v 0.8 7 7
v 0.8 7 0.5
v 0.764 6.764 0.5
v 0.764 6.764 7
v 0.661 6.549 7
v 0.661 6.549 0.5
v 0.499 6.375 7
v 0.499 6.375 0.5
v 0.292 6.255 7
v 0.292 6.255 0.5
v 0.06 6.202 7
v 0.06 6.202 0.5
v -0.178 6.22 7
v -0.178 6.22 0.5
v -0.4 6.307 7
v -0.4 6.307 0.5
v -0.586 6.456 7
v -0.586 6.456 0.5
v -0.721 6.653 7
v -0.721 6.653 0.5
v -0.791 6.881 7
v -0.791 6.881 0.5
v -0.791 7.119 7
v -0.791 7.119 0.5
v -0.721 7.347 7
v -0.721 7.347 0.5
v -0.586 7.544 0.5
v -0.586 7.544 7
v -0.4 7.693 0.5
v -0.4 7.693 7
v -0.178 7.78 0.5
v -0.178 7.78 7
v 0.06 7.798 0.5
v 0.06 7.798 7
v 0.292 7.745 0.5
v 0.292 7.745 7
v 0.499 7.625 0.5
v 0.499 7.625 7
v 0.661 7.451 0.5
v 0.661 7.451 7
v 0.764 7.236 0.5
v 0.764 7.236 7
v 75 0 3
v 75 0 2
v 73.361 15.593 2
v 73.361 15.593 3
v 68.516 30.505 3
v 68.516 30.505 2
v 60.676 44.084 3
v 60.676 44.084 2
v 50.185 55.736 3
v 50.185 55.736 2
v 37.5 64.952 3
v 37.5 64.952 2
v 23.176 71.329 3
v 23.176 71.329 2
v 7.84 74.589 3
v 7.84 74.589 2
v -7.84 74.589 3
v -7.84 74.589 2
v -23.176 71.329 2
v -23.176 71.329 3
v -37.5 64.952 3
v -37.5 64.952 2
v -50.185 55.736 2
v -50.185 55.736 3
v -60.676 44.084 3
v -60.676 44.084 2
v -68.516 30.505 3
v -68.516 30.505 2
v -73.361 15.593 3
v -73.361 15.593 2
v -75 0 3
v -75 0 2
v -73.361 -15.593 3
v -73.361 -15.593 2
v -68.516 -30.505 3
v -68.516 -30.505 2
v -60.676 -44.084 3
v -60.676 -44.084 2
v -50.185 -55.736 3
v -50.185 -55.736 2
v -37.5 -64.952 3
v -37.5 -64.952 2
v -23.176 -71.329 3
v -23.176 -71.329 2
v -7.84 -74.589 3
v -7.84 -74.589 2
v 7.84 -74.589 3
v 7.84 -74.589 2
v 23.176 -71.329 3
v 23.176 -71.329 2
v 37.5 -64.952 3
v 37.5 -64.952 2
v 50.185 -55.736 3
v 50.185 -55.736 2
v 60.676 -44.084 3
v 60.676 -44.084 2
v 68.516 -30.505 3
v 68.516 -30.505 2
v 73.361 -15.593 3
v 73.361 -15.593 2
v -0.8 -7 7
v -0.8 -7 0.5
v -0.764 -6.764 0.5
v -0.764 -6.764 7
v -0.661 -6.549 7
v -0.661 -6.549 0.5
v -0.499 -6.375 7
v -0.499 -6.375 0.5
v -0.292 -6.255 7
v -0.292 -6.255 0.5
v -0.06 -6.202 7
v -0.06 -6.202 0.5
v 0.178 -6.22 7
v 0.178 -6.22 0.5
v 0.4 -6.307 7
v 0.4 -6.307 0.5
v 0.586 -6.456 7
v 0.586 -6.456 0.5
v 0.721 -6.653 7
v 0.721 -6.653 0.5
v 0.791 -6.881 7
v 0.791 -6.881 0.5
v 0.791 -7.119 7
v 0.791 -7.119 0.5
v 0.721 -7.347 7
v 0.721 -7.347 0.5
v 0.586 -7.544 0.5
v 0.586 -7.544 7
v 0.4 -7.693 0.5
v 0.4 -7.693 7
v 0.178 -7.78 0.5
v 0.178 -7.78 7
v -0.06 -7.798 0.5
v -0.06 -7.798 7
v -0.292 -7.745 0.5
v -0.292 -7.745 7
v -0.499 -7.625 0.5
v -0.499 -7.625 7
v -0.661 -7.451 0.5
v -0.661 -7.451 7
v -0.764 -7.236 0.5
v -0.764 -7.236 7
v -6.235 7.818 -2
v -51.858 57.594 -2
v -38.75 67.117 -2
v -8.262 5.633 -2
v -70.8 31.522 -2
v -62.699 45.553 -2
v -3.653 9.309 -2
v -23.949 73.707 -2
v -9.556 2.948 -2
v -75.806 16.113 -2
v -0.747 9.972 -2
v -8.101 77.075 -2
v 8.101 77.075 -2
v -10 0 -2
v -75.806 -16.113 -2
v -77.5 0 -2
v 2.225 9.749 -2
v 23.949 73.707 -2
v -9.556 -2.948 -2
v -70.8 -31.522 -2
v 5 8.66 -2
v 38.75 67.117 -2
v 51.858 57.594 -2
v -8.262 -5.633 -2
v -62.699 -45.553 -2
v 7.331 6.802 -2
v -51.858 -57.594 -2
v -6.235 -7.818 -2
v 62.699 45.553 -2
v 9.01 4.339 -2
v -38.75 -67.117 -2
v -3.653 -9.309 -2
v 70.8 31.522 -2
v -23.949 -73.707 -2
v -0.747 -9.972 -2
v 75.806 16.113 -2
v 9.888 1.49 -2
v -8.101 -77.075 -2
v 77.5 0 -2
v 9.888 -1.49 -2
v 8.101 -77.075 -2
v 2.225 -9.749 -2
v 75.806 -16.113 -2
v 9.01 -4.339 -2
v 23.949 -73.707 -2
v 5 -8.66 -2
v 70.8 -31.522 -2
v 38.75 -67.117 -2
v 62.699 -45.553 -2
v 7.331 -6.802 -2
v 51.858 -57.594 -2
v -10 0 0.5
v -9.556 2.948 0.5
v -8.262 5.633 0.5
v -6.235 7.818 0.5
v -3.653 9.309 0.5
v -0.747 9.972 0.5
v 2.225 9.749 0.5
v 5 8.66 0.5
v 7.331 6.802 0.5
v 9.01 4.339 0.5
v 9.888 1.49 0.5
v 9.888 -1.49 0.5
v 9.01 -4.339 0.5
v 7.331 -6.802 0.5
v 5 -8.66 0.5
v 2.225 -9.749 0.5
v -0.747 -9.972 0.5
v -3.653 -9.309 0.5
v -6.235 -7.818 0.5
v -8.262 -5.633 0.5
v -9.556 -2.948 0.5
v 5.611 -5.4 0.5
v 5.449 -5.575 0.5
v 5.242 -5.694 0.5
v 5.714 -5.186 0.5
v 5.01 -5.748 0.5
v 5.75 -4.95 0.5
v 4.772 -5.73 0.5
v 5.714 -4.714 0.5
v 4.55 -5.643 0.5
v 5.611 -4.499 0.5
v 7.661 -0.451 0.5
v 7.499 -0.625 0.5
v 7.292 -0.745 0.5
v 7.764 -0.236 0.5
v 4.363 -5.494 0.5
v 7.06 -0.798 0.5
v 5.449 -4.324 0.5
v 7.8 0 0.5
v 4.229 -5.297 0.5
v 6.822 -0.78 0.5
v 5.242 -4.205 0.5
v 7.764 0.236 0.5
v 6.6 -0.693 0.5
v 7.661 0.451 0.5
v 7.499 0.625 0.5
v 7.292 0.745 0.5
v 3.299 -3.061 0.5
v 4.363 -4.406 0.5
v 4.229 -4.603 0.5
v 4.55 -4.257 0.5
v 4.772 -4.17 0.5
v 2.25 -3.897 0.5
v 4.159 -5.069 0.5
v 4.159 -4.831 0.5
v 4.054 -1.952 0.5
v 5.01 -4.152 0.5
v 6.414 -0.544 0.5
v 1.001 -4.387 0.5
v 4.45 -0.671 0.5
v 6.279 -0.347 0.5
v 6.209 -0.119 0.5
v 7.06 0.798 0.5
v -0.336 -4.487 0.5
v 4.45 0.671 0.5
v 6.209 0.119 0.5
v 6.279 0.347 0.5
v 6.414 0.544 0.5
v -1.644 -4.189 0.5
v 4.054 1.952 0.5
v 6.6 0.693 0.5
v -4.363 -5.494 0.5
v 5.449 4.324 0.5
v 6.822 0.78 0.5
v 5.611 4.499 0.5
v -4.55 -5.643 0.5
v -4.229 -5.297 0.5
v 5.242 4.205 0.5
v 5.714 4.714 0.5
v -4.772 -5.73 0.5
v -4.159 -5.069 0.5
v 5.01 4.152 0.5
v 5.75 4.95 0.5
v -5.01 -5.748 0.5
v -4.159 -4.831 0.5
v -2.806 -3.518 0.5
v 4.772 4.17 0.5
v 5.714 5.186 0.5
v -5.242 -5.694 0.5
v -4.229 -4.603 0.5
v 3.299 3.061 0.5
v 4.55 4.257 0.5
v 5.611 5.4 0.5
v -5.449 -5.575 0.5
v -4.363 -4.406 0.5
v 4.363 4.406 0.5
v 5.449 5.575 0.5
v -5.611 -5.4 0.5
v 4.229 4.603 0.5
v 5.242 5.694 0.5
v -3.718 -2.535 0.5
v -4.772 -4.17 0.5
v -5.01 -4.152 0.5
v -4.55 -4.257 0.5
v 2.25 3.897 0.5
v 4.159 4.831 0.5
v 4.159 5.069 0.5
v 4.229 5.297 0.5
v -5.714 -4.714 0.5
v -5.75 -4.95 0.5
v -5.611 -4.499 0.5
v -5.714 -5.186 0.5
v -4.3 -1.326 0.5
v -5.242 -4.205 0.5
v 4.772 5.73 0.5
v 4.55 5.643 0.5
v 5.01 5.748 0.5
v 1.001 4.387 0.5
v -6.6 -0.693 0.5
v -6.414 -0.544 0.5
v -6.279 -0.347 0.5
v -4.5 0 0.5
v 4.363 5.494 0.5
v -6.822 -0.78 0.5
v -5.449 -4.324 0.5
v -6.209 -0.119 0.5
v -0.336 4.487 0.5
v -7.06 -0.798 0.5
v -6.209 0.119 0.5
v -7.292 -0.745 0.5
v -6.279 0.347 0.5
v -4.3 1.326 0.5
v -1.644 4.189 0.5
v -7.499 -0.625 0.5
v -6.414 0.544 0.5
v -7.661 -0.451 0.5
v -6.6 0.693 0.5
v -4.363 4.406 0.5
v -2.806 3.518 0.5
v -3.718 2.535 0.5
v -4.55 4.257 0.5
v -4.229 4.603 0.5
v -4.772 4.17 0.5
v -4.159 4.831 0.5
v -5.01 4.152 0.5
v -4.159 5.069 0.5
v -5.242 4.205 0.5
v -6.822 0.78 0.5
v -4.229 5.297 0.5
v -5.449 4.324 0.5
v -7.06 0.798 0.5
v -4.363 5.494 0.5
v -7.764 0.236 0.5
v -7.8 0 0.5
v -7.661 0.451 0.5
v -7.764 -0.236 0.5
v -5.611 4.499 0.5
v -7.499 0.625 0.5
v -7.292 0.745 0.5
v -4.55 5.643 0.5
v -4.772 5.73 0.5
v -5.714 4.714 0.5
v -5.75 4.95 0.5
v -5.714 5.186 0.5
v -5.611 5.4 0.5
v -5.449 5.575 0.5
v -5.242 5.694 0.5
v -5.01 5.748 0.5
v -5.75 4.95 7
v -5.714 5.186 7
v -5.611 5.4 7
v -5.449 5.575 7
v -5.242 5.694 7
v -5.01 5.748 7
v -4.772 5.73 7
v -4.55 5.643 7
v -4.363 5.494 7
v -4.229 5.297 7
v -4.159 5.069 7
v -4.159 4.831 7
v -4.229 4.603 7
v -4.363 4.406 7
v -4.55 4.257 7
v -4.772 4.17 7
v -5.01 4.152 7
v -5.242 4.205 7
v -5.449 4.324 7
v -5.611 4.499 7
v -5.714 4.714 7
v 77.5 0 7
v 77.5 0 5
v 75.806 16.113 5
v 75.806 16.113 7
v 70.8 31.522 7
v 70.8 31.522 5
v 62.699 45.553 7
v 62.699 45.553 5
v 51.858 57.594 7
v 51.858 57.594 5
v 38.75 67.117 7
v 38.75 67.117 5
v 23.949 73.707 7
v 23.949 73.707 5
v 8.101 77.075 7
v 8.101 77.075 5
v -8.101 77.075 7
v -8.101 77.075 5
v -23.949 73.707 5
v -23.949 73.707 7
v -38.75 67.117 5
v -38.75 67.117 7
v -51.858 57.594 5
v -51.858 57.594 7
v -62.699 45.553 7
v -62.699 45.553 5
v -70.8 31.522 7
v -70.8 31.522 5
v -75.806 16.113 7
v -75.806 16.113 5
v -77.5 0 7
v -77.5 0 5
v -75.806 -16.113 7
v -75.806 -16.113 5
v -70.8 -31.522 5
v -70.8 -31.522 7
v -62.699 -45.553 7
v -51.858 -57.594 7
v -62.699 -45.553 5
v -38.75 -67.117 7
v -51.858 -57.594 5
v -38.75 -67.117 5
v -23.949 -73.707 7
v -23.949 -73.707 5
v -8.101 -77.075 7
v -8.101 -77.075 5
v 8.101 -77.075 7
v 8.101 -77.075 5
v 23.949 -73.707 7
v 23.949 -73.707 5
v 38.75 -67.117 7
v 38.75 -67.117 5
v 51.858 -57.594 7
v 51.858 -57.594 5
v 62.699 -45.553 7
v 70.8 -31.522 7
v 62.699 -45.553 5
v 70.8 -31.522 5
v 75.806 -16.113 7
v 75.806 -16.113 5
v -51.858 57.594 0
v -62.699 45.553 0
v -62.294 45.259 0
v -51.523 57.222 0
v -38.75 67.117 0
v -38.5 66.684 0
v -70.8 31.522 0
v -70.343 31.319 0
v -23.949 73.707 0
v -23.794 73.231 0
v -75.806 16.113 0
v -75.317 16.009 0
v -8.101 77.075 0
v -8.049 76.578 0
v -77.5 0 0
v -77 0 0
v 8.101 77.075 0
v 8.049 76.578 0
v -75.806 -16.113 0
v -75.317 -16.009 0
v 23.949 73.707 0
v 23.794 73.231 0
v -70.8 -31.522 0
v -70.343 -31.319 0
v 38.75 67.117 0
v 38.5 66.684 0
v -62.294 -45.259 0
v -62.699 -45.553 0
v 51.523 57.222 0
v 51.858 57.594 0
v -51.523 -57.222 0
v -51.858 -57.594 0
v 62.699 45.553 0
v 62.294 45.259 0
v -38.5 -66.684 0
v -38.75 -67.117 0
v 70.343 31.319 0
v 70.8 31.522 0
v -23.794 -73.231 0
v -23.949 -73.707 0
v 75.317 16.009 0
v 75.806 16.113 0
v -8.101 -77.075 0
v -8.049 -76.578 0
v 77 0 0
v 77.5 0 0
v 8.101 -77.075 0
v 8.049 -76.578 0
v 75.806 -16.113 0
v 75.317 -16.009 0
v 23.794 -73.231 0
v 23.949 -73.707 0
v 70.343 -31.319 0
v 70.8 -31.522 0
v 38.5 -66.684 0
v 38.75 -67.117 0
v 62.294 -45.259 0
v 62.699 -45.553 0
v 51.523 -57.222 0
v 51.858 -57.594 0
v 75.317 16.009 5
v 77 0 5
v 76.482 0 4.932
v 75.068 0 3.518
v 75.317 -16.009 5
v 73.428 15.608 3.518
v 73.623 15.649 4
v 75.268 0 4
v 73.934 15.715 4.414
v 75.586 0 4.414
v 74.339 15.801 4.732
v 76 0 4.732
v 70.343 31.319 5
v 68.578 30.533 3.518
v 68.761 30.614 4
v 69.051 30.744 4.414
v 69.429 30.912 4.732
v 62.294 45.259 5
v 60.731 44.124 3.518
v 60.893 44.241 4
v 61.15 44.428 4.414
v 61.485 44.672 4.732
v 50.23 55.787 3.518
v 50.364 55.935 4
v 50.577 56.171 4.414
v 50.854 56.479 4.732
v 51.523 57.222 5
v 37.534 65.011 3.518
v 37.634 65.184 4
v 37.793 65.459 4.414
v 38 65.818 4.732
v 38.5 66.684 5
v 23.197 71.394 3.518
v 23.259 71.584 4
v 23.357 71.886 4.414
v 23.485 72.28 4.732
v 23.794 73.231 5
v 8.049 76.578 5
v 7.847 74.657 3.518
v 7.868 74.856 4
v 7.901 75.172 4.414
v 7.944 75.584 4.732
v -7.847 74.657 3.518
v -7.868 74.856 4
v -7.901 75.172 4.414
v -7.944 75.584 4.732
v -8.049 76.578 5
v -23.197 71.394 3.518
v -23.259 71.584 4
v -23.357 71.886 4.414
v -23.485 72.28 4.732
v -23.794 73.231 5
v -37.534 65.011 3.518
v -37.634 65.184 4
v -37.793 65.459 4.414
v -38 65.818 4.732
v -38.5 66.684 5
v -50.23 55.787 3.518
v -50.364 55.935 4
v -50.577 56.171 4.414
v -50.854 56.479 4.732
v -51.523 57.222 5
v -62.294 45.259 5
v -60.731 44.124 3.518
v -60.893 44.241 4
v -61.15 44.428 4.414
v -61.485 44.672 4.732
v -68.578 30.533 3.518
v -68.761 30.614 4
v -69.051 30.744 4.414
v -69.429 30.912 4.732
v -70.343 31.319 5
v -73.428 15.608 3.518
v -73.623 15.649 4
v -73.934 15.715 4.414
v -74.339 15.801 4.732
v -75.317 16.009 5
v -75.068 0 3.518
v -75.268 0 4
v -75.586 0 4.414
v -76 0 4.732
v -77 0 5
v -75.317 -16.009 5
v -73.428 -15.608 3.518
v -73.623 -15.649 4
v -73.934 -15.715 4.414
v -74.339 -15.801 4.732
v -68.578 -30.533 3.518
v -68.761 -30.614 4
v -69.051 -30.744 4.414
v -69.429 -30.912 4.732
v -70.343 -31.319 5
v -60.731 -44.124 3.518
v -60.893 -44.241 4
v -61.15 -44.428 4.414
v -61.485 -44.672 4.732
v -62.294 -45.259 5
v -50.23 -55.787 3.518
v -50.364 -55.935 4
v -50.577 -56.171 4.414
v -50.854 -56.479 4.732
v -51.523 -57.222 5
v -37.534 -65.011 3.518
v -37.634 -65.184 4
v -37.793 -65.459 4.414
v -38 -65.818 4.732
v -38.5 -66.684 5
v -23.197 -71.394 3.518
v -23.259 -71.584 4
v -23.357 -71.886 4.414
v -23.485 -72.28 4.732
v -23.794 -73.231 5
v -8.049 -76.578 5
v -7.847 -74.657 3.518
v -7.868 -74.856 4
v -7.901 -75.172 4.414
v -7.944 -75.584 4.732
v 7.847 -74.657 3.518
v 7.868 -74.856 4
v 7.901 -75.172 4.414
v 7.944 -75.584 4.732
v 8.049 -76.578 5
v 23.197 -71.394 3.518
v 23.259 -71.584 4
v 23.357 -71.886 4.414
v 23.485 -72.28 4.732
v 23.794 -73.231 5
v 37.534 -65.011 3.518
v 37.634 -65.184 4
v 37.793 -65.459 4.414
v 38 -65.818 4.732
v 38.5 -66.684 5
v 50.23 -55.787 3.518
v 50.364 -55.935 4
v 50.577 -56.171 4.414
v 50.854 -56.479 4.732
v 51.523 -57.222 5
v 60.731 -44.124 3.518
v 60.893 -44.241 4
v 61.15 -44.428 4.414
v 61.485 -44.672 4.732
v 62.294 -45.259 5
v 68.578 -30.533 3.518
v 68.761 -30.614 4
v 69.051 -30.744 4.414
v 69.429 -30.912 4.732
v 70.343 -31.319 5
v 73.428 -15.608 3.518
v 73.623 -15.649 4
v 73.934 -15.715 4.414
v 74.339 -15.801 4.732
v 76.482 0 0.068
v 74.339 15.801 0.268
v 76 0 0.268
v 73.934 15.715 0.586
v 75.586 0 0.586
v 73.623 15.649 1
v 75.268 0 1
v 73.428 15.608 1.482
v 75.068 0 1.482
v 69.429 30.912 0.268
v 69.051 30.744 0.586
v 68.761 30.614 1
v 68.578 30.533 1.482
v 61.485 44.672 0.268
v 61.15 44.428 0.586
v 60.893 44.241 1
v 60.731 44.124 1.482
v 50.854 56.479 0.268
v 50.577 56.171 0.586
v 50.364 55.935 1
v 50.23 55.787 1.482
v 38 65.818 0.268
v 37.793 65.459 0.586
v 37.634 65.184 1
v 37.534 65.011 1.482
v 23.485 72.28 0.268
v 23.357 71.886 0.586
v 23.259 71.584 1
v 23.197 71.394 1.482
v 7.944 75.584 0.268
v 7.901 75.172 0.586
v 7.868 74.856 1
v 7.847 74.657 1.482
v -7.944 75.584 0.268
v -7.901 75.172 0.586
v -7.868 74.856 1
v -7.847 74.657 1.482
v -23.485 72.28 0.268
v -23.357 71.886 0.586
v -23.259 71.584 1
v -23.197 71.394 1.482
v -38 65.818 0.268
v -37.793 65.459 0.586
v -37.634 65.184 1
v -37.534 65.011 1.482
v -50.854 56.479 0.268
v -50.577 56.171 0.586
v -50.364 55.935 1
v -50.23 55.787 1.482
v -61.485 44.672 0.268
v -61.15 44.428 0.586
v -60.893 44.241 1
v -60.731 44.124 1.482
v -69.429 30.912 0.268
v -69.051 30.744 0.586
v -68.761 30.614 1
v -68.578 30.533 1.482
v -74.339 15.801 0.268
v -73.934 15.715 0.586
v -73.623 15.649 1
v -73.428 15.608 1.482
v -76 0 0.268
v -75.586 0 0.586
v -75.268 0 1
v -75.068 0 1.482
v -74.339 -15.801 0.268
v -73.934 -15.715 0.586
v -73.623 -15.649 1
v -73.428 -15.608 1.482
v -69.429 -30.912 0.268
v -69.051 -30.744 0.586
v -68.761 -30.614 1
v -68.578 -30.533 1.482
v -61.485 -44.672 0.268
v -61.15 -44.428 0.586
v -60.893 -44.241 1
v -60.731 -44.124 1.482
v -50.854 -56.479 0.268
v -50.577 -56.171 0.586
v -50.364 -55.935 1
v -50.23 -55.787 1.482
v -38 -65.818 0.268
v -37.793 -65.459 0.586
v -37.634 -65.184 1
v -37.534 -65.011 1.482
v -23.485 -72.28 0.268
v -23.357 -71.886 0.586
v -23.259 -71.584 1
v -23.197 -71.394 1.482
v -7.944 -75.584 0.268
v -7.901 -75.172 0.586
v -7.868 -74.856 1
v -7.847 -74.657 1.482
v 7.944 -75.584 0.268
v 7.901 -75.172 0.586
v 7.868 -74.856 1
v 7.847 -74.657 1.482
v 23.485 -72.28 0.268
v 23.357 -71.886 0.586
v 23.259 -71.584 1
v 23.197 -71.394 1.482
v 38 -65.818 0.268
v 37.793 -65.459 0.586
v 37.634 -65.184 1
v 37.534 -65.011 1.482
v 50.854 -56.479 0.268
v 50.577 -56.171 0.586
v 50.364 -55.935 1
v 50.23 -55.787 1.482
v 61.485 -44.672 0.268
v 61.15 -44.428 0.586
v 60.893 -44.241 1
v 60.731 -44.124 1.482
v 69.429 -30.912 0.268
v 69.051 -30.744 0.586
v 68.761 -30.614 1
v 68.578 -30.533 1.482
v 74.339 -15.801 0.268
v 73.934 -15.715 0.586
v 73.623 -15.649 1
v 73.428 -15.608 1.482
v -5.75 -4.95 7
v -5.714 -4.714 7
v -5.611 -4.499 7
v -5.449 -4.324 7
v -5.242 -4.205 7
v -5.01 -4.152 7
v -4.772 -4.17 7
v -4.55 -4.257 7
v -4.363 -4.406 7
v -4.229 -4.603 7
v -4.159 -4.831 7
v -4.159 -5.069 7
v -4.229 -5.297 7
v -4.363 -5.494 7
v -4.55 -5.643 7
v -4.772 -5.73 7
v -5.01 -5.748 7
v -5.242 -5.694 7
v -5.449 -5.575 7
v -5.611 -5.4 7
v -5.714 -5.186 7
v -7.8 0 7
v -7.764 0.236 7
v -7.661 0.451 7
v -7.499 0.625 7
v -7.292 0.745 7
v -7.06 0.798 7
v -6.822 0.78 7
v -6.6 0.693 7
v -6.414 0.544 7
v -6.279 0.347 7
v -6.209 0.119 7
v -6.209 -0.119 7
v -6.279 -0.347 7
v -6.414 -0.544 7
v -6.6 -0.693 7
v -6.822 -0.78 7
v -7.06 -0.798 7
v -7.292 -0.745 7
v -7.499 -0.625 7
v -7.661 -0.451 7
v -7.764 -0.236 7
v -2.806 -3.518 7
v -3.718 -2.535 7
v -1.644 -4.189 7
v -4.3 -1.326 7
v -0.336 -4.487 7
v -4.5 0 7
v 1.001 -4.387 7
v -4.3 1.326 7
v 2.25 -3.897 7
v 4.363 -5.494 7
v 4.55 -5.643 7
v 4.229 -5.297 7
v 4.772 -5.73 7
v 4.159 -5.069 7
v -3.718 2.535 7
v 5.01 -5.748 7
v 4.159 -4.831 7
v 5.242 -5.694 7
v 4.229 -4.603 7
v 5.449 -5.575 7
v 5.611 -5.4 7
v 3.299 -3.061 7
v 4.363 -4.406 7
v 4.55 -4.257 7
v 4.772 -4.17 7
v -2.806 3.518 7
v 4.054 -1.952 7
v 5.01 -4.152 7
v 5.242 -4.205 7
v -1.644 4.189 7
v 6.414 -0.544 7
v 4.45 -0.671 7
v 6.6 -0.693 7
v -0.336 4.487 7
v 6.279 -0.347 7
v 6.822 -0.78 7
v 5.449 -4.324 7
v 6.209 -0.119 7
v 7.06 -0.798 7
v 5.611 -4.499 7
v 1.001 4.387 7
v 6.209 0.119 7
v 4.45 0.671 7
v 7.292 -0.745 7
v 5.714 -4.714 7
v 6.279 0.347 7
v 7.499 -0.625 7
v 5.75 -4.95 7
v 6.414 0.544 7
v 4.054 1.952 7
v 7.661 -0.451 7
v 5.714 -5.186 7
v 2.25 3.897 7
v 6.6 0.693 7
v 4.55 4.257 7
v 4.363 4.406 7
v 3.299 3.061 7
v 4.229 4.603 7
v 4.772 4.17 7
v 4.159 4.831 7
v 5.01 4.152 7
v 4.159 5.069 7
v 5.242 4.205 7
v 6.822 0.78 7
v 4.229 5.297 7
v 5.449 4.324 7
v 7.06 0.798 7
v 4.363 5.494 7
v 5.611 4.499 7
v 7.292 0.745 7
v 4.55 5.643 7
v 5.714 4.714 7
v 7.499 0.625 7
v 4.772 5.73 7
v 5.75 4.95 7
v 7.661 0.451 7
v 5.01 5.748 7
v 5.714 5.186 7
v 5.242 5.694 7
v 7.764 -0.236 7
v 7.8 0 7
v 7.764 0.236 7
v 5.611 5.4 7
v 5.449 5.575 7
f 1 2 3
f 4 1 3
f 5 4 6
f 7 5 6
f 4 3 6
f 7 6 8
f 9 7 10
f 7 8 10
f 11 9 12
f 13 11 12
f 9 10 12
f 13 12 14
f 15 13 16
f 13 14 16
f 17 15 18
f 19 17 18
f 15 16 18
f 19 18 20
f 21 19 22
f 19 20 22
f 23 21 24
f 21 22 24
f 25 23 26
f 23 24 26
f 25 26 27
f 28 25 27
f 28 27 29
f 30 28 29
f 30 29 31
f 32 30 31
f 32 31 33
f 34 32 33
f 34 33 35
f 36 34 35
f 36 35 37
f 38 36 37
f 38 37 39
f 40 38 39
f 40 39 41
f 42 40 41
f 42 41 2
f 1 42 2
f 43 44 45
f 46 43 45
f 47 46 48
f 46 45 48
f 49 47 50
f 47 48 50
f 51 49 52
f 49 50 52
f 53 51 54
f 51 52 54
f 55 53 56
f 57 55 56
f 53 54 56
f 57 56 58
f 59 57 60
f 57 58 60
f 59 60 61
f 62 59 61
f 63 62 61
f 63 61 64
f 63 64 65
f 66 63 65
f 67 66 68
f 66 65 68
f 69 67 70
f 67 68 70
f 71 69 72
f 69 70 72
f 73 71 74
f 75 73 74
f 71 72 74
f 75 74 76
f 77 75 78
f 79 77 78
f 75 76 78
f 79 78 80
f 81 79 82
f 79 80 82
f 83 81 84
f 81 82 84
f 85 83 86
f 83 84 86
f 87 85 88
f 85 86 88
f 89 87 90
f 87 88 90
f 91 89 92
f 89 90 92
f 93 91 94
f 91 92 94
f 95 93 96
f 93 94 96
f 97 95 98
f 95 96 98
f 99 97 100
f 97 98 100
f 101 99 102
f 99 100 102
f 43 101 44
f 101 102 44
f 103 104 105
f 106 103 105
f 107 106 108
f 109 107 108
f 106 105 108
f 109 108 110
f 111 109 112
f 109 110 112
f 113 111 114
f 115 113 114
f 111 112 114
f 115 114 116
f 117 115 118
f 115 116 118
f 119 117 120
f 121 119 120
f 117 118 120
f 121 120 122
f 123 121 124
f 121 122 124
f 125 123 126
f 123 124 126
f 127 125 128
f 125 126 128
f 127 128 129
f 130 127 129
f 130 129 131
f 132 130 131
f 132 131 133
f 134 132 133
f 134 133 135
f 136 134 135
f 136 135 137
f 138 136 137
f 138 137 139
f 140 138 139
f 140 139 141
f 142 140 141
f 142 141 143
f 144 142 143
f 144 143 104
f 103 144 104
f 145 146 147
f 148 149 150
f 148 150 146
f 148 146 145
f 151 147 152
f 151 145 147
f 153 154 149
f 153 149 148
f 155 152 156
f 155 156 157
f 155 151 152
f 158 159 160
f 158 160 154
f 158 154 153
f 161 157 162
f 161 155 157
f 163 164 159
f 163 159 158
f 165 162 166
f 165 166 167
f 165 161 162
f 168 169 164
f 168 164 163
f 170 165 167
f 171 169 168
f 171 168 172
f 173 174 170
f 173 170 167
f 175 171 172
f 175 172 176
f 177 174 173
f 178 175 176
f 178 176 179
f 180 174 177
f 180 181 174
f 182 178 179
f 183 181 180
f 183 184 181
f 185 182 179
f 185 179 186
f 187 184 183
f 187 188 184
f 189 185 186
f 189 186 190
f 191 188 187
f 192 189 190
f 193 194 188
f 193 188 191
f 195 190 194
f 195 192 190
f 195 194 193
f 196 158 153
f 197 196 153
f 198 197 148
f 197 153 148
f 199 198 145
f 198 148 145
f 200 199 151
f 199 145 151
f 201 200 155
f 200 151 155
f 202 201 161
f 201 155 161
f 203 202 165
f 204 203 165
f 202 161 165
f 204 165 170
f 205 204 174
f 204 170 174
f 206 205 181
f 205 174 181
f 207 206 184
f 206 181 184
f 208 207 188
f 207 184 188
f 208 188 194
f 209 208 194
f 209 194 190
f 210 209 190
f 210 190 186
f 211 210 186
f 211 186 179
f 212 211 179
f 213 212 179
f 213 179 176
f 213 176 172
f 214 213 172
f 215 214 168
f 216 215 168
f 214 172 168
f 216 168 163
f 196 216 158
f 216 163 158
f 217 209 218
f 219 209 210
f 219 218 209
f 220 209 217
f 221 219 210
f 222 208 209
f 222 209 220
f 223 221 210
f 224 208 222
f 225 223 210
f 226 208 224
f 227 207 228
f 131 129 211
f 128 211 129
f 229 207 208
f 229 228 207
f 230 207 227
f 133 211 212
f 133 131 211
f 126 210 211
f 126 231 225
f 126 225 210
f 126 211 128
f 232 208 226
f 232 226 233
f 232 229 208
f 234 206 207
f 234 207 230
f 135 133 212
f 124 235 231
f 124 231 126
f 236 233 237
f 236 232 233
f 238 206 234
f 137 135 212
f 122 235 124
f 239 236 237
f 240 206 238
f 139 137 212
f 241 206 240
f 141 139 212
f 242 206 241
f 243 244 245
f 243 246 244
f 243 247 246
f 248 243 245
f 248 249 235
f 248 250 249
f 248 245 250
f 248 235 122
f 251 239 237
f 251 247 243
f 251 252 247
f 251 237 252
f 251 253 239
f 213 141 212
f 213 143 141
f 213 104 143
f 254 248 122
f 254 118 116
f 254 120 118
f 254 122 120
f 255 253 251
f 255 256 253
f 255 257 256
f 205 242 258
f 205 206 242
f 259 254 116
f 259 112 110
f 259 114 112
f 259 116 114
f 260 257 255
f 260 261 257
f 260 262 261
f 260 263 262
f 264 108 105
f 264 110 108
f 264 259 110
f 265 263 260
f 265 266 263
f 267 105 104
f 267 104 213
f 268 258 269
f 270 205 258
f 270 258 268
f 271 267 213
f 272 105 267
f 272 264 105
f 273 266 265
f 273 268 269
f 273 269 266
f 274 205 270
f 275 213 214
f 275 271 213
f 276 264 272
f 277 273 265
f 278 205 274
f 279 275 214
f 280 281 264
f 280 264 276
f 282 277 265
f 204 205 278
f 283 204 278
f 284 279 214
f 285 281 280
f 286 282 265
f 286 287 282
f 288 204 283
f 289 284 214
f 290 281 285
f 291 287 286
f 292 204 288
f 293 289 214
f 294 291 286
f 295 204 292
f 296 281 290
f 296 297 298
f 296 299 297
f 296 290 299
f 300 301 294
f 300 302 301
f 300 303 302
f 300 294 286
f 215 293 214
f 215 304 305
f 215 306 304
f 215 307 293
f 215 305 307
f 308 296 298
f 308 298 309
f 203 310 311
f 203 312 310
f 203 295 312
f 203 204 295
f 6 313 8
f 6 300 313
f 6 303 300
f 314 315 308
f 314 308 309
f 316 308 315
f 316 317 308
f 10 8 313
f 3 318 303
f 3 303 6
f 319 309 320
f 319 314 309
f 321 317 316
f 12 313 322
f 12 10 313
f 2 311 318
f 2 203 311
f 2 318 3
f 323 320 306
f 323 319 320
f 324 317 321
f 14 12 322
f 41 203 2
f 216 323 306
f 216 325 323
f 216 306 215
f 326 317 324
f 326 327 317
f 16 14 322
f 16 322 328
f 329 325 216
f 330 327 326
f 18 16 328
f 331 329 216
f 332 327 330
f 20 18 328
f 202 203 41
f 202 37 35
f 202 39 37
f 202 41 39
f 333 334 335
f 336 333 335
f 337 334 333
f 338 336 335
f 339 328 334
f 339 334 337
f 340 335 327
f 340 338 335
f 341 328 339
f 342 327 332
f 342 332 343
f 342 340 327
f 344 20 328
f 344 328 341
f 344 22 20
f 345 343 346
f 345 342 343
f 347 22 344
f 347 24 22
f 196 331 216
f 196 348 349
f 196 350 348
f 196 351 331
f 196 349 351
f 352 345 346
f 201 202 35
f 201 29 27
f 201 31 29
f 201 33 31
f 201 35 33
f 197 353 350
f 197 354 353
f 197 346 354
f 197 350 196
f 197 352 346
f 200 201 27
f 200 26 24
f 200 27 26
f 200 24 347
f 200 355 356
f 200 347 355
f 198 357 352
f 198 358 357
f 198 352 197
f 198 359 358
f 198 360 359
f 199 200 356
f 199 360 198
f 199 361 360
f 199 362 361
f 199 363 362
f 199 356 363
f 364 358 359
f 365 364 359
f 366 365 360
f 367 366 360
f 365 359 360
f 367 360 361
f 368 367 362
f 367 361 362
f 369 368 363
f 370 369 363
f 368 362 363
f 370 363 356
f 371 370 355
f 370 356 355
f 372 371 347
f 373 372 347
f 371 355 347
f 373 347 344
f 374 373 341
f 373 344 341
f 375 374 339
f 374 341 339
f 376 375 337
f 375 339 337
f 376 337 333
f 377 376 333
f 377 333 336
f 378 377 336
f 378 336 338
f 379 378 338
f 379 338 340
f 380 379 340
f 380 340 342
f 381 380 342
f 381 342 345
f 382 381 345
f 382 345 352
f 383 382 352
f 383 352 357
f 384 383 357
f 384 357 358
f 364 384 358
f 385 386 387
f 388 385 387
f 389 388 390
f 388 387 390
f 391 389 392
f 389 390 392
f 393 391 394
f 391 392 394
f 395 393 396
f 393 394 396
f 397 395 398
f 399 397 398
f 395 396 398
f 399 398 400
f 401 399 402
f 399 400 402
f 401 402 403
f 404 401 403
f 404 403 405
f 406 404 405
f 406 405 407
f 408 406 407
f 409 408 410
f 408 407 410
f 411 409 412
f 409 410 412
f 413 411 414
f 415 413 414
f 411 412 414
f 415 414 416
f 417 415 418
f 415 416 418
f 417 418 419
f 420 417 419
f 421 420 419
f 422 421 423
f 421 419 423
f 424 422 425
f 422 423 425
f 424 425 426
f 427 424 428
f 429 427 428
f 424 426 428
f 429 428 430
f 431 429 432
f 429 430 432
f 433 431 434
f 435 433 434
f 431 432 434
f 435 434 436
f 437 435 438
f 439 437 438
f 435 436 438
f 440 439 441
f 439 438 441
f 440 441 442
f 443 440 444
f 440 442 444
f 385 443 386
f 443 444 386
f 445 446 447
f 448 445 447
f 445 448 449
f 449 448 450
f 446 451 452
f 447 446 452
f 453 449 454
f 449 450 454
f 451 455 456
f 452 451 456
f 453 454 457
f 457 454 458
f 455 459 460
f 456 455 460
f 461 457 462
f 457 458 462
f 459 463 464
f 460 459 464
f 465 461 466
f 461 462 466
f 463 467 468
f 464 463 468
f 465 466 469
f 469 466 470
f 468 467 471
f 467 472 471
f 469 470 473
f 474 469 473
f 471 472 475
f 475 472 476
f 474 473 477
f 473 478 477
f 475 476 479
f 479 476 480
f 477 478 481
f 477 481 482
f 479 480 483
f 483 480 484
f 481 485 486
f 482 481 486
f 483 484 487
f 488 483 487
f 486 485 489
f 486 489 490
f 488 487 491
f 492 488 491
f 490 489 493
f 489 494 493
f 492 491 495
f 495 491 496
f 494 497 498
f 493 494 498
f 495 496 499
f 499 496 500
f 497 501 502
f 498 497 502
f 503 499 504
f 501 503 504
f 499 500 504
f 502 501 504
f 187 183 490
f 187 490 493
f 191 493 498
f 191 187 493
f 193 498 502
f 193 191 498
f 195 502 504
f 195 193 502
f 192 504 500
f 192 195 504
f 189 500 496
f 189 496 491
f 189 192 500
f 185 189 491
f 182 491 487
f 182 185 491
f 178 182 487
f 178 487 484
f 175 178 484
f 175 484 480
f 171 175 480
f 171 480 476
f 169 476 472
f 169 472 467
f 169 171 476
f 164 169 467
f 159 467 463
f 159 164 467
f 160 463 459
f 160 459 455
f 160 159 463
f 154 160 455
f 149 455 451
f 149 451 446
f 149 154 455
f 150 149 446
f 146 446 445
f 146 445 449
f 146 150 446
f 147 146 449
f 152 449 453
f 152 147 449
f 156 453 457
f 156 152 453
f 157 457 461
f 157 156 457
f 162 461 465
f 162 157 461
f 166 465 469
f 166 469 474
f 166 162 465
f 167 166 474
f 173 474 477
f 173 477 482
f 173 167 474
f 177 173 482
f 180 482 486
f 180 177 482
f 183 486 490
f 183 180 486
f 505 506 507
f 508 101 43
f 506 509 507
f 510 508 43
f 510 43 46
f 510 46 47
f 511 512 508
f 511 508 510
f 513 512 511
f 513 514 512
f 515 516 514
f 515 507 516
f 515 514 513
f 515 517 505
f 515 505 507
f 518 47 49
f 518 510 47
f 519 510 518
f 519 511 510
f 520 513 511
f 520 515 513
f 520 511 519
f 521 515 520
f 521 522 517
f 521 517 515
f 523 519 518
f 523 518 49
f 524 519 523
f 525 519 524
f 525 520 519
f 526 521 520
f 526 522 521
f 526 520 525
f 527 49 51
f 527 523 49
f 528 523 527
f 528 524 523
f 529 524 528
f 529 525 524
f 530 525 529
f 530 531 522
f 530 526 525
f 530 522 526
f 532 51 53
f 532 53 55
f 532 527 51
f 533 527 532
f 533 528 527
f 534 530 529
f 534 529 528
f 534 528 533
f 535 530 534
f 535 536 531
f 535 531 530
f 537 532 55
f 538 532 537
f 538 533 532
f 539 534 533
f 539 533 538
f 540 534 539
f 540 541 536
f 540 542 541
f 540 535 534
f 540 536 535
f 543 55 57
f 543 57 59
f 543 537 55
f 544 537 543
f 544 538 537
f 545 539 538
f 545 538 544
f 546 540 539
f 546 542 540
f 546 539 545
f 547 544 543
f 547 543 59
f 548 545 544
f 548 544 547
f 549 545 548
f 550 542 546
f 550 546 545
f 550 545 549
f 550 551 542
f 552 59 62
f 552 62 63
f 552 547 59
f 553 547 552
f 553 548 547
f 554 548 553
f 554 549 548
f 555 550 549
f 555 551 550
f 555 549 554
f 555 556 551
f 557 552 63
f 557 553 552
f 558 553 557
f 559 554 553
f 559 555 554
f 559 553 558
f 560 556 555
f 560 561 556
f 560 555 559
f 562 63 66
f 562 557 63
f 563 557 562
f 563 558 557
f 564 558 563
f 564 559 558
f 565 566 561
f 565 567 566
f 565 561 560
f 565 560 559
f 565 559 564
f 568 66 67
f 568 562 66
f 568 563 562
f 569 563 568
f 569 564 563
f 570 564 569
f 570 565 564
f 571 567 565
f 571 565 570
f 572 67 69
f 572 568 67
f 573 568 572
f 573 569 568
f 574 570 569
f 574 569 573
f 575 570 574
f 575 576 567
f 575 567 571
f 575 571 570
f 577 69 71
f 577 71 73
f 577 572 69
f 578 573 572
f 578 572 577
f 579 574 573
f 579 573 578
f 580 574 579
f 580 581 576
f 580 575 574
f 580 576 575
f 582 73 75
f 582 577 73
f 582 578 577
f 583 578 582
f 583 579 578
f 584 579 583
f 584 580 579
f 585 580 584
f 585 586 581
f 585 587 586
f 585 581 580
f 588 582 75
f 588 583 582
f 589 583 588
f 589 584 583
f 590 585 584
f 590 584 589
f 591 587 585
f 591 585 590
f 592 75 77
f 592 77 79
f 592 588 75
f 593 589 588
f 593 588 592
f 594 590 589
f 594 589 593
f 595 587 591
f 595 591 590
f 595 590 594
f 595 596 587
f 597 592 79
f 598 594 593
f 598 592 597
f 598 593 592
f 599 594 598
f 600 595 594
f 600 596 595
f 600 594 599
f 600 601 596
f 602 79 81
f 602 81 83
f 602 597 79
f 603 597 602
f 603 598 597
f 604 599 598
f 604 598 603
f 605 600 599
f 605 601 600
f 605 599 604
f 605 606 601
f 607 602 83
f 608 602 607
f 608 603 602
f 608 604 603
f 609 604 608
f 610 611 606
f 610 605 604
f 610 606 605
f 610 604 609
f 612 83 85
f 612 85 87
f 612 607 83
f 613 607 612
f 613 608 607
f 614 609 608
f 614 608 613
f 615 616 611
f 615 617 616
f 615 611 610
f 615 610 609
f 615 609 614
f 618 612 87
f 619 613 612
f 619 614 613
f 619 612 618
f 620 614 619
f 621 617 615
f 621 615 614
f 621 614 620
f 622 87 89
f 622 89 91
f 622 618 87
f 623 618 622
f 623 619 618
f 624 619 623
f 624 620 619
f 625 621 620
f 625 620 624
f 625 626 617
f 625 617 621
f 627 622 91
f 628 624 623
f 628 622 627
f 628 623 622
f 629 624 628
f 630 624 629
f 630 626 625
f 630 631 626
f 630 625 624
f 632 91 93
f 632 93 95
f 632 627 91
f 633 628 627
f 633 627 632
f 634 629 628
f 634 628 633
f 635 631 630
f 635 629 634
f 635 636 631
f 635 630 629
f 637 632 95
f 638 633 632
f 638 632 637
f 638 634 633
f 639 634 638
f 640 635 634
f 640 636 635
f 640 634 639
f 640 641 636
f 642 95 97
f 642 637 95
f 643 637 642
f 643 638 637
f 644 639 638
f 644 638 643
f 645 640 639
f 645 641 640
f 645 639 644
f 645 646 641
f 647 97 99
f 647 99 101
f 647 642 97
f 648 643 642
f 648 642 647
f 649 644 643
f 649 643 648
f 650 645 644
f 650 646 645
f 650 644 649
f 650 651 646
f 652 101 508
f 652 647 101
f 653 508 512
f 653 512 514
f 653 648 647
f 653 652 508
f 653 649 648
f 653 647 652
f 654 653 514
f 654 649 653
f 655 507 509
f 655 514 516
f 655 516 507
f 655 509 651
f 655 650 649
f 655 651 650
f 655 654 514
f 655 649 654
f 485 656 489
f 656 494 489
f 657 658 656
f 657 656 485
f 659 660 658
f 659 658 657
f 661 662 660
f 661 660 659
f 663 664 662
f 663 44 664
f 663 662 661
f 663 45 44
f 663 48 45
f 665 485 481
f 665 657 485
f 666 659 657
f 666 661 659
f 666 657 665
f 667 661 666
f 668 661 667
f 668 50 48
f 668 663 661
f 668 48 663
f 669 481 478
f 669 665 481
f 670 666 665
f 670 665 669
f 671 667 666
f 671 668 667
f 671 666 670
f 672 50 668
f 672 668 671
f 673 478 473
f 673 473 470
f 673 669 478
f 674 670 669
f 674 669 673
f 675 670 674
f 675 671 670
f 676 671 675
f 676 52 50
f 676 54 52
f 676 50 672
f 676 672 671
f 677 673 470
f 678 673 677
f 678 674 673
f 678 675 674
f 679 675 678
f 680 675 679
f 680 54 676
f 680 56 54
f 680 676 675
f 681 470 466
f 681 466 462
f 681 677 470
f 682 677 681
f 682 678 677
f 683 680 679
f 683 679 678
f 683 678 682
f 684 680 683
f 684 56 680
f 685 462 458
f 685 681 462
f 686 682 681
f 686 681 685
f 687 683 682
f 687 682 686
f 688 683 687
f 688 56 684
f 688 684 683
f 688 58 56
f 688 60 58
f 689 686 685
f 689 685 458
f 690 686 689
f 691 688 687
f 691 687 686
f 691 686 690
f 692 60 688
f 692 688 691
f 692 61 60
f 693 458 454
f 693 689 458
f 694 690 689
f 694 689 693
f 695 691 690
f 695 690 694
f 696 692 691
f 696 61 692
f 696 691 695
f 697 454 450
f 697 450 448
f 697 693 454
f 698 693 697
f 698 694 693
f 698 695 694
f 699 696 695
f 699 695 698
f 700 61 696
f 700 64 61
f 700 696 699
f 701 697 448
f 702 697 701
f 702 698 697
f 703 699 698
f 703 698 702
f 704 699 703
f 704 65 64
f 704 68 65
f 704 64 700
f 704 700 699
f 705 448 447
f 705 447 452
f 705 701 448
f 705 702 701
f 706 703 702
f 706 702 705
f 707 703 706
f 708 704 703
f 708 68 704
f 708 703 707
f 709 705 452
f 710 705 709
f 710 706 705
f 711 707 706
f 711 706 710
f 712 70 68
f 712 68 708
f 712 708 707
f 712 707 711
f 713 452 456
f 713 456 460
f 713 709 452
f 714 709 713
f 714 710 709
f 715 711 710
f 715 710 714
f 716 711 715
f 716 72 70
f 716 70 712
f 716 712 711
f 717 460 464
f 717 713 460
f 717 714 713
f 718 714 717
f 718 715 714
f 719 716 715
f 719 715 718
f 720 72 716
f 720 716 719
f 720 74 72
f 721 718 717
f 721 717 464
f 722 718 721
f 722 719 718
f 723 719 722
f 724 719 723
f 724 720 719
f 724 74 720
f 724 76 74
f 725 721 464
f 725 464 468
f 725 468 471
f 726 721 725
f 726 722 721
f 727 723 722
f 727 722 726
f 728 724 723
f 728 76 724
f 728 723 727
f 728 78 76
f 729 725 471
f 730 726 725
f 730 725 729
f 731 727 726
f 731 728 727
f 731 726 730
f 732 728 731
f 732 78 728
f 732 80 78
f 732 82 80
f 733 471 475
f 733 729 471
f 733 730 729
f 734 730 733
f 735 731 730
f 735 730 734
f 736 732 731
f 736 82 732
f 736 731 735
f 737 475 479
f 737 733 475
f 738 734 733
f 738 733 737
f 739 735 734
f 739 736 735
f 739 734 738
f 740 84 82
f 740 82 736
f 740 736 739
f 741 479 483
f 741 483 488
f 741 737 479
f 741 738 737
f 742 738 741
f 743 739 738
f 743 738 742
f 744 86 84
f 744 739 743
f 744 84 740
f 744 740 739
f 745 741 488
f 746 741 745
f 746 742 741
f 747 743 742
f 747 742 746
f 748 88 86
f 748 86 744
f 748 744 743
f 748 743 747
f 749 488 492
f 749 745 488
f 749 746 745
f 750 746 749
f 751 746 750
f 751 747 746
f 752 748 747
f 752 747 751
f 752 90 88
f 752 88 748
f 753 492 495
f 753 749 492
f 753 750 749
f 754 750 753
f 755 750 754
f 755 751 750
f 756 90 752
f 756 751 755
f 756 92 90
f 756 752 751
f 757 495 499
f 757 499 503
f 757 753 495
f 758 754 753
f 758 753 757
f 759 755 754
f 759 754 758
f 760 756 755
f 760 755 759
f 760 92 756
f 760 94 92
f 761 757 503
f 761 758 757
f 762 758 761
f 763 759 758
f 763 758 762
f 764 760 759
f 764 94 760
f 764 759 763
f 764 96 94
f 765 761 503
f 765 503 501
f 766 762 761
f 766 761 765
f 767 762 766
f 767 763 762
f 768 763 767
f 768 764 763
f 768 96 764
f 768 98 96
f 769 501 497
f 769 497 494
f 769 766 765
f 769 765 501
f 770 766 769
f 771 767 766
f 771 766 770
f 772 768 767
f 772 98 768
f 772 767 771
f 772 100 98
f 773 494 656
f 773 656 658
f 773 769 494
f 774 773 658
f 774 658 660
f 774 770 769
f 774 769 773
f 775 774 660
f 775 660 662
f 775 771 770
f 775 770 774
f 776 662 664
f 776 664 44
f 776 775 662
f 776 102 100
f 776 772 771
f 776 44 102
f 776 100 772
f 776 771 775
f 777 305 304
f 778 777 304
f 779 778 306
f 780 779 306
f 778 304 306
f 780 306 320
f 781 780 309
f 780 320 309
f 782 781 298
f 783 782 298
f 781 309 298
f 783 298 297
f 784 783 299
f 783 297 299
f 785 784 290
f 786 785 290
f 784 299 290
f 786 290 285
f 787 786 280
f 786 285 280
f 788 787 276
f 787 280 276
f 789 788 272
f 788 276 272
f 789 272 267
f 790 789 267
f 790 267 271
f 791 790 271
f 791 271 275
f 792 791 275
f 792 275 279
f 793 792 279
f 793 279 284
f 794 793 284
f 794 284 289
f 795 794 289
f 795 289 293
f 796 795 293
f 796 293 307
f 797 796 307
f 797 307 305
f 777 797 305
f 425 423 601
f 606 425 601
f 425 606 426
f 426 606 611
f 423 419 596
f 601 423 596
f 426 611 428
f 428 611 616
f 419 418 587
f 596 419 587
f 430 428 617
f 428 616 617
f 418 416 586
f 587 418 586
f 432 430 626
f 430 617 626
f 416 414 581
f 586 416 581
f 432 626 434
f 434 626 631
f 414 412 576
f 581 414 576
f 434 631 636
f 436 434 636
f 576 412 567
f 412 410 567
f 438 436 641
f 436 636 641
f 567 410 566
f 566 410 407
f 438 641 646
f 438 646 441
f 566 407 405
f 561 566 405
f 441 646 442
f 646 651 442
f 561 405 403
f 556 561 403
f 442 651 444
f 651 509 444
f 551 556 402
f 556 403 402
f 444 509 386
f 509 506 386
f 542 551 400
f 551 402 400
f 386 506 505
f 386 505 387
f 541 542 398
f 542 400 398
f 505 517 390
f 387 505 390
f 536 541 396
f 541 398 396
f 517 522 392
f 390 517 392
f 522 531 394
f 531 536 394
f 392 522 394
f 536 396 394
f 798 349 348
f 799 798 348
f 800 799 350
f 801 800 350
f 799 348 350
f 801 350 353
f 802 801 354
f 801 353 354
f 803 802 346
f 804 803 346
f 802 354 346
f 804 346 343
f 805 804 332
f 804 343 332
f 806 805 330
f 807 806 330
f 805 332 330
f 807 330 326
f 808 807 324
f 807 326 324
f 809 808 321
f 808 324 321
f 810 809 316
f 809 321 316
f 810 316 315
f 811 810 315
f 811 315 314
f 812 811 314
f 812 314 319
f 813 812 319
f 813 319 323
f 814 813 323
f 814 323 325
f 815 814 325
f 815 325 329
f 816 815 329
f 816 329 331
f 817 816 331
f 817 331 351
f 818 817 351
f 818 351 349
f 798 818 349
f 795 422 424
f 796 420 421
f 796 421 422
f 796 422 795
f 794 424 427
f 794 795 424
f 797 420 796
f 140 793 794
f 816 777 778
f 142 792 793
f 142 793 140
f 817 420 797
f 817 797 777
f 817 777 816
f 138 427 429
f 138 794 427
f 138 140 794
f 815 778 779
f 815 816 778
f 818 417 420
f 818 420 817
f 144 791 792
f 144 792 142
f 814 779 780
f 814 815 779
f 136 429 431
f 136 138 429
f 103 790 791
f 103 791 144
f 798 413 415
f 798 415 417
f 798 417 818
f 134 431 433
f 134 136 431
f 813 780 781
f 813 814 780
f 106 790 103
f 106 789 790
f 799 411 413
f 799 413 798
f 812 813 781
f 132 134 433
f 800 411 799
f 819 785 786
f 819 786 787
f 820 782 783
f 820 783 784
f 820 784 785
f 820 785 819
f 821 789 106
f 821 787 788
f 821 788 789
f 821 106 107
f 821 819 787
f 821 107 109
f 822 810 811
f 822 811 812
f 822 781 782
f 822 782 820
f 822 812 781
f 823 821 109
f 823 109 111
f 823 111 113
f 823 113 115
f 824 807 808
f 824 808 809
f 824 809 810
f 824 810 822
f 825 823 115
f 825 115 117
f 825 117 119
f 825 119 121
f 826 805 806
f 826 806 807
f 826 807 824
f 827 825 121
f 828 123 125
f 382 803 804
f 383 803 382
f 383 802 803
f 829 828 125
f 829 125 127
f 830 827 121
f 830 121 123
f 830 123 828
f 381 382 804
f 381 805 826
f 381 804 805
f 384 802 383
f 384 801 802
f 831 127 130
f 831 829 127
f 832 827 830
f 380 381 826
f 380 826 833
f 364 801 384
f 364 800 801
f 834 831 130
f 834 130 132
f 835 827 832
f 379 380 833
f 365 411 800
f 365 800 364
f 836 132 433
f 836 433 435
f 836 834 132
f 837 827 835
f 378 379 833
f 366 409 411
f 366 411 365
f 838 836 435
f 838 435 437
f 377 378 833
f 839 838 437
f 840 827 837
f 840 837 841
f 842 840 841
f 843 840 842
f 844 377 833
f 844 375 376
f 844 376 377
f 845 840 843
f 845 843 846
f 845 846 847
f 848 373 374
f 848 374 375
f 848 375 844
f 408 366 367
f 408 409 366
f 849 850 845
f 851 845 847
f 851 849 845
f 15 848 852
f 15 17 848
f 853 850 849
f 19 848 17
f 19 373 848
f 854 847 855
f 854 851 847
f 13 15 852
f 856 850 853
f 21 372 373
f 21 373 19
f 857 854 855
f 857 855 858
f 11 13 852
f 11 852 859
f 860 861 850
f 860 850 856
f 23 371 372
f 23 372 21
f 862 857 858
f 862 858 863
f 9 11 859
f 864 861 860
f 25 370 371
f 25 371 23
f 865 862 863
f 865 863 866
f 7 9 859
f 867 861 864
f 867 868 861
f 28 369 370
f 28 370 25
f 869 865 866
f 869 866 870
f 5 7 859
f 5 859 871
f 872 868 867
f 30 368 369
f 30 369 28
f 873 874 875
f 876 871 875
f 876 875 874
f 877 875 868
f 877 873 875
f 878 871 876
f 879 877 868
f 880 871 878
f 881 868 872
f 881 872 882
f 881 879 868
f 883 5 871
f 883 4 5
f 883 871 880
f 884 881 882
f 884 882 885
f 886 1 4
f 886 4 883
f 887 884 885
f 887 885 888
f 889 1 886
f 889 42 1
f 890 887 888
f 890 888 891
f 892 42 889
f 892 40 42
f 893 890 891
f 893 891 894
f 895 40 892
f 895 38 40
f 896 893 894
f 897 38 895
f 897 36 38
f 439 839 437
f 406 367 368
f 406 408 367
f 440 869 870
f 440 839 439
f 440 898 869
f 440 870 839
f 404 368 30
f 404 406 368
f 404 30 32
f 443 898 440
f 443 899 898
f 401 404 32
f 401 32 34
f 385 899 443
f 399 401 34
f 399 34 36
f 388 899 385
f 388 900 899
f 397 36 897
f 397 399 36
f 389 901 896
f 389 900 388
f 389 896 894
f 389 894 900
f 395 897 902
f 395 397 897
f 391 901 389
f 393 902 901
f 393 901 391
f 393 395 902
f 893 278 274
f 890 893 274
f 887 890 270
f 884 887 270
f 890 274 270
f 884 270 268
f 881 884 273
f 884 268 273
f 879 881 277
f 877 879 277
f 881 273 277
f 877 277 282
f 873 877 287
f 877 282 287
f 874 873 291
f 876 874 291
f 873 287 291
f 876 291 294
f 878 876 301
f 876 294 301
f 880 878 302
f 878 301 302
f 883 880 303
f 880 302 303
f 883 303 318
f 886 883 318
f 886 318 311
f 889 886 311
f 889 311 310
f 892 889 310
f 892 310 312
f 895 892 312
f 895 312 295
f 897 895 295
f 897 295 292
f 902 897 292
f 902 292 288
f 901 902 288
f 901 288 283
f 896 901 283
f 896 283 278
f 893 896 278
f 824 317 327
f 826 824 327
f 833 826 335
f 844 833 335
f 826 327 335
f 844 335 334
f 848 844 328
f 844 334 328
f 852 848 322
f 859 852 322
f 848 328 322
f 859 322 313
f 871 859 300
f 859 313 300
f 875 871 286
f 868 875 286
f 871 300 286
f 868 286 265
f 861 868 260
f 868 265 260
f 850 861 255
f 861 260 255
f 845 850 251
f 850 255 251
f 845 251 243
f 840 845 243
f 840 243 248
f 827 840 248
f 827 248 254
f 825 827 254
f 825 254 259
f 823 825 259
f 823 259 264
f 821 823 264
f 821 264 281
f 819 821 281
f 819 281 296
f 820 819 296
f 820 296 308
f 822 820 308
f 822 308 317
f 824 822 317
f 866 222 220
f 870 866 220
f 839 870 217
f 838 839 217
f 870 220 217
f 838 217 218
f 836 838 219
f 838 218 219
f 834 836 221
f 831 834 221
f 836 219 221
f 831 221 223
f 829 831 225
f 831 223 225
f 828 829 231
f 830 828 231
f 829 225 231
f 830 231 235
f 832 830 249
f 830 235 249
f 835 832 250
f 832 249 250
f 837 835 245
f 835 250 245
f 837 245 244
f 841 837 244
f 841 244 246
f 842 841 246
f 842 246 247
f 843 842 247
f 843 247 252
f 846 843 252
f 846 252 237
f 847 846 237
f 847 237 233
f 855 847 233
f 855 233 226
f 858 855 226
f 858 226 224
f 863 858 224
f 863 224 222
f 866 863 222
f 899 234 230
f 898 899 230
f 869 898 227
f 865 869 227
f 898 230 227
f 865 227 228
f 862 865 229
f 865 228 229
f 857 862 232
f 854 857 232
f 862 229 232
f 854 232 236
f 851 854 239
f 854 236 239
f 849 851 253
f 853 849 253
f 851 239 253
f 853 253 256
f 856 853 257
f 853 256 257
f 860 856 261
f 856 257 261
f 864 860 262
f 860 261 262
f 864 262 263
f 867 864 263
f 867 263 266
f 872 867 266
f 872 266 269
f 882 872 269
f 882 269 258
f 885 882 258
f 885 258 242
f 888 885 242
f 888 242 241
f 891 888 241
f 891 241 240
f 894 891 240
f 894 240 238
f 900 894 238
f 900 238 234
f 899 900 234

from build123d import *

# Parameters (mm, degrees)
SKETCH1_R           = 75
BOSS_EXTRUDE1_DEPTH = 5
SKETCH2_R           = 77.5
BOSS_EXTRUDE2_DEPTH = 2
BOSS_EXTRUDE3_START = 2
SKETCH3_R           = 77.5
BOSS_EXTRUDE3_DEPTH = 2
CUT_EXTRUDE2_DEPTH  = 110.970450577
SKETCH10_R          = 10
CUT_EXTRUDE3_DEPTH  = 2.5
FILLET1_R           = 2


with BuildPart() as part:
    # Sketch1 → Boss-Extrude1 (new body)
    with BuildSketch(Plane.XY):
        Circle(SKETCH1_R)
    extrude(amount=BOSS_EXTRUDE1_DEPTH)

    # Sketch2 → Boss-Extrude2 (add)
    with BuildSketch(Plane.XY.offset(5)):
        Circle(SKETCH2_R)
    extrude(amount=BOSS_EXTRUDE2_DEPTH)

    # Sketch3 → Boss-Extrude3 (add)
    with BuildSketch(Plane(origin=(0, 0, 0), x_dir=(-1, 0, 0), z_dir=(0, 0, -1)).offset(BOSS_EXTRUDE3_START)):
        with Locations(Location((0, 0, 0), (0, 0, 180))):
            Circle(SKETCH3_R)
    extrude(amount=-BOSS_EXTRUDE3_DEPTH)

    # Sketch5 → Cut-Extrude2 (cut, through all)
    with BuildSketch(Plane(origin=(0, 0, -2), x_dir=(-1, 0, 0), z_dir=(0, 0, -1))):
        with BuildLine():
            ThreePointArc((-4.5, 0), (0, -4.5), (4.5, 0))
            ThreePointArc((4.5, 0), (0, 4.5), (-4.5, 0))
        make_face()
        with BuildLine():
            ThreePointArc((-4.149747468, 4.949747468), (-4.949747468, 5.749747468), (-5.749747468, 4.949747468))
            ThreePointArc((-5.749747468, 4.949747468), (-4.949747468, 4.149747468), (-4.149747468, 4.949747468))
        make_face()
        with BuildLine():
            ThreePointArc((-6.2, 0), (-7, 0.8), (-7.8, 0))
            ThreePointArc((-7.8, 0), (-7, -0.8), (-6.2, 0))
        make_face()
        with BuildLine():
            ThreePointArc((-4.149747468, -4.949747468), (-4.949747468, -4.149747468), (-5.749747468, -4.949747468))
            ThreePointArc((-5.749747468, -4.949747468), (-4.949747468, -5.749747468), (-4.149747468, -4.949747468))
        make_face()
        with BuildLine():
            ThreePointArc((-0.8, -7), (0, -7.8), (0.8, -7))
            ThreePointArc((0.8, -7), (0, -6.2), (-0.8, -7))
        make_face()
        with BuildLine():
            ThreePointArc((4.149747468, -4.949747468), (4.949747468, -5.749747468), (5.749747468, -4.949747468))
            ThreePointArc((5.749747468, -4.949747468), (4.949747468, -4.149747468), (4.149747468, -4.949747468))
        make_face()
        with BuildLine():
            ThreePointArc((6.2, 0), (7, -0.8), (7.8, 0))
            ThreePointArc((7.8, 0), (7, 0.8), (6.2, 0))
        make_face()
        with BuildLine():
            ThreePointArc((4.149747468, 4.949747468), (4.949747468, 4.149747468), (5.749747468, 4.949747468))
            ThreePointArc((5.749747468, 4.949747468), (4.949747468, 5.749747468), (4.149747468, 4.949747468))
        make_face()
        with BuildLine():
            ThreePointArc((0.8, 7), (0, 7.8), (-0.8, 7))
            ThreePointArc((-0.8, 7), (0, 6.2), (0.8, 7))
        make_face()
    extrude(amount=-CUT_EXTRUDE2_DEPTH, mode=Mode.SUBTRACT)

    # Sketch10 → Cut-Extrude3 (cut)
    with BuildSketch(Plane(origin=(0, 0, -2), x_dir=(-1, 0, 0), z_dir=(0, 0, -1))):
        Circle(SKETCH10_R)
    extrude(amount=-CUT_EXTRUDE3_DEPTH, mode=Mode.SUBTRACT)

    # Fillet1
    fillet1_edges = [part.edges().sort_by_distance(p)[0] for p in [
        (-75, 0, 5),
        (-75, 0, 0),
    ]]
    fillet(fillet1_edges, radius=FILLET1_R)


solid = part.part
